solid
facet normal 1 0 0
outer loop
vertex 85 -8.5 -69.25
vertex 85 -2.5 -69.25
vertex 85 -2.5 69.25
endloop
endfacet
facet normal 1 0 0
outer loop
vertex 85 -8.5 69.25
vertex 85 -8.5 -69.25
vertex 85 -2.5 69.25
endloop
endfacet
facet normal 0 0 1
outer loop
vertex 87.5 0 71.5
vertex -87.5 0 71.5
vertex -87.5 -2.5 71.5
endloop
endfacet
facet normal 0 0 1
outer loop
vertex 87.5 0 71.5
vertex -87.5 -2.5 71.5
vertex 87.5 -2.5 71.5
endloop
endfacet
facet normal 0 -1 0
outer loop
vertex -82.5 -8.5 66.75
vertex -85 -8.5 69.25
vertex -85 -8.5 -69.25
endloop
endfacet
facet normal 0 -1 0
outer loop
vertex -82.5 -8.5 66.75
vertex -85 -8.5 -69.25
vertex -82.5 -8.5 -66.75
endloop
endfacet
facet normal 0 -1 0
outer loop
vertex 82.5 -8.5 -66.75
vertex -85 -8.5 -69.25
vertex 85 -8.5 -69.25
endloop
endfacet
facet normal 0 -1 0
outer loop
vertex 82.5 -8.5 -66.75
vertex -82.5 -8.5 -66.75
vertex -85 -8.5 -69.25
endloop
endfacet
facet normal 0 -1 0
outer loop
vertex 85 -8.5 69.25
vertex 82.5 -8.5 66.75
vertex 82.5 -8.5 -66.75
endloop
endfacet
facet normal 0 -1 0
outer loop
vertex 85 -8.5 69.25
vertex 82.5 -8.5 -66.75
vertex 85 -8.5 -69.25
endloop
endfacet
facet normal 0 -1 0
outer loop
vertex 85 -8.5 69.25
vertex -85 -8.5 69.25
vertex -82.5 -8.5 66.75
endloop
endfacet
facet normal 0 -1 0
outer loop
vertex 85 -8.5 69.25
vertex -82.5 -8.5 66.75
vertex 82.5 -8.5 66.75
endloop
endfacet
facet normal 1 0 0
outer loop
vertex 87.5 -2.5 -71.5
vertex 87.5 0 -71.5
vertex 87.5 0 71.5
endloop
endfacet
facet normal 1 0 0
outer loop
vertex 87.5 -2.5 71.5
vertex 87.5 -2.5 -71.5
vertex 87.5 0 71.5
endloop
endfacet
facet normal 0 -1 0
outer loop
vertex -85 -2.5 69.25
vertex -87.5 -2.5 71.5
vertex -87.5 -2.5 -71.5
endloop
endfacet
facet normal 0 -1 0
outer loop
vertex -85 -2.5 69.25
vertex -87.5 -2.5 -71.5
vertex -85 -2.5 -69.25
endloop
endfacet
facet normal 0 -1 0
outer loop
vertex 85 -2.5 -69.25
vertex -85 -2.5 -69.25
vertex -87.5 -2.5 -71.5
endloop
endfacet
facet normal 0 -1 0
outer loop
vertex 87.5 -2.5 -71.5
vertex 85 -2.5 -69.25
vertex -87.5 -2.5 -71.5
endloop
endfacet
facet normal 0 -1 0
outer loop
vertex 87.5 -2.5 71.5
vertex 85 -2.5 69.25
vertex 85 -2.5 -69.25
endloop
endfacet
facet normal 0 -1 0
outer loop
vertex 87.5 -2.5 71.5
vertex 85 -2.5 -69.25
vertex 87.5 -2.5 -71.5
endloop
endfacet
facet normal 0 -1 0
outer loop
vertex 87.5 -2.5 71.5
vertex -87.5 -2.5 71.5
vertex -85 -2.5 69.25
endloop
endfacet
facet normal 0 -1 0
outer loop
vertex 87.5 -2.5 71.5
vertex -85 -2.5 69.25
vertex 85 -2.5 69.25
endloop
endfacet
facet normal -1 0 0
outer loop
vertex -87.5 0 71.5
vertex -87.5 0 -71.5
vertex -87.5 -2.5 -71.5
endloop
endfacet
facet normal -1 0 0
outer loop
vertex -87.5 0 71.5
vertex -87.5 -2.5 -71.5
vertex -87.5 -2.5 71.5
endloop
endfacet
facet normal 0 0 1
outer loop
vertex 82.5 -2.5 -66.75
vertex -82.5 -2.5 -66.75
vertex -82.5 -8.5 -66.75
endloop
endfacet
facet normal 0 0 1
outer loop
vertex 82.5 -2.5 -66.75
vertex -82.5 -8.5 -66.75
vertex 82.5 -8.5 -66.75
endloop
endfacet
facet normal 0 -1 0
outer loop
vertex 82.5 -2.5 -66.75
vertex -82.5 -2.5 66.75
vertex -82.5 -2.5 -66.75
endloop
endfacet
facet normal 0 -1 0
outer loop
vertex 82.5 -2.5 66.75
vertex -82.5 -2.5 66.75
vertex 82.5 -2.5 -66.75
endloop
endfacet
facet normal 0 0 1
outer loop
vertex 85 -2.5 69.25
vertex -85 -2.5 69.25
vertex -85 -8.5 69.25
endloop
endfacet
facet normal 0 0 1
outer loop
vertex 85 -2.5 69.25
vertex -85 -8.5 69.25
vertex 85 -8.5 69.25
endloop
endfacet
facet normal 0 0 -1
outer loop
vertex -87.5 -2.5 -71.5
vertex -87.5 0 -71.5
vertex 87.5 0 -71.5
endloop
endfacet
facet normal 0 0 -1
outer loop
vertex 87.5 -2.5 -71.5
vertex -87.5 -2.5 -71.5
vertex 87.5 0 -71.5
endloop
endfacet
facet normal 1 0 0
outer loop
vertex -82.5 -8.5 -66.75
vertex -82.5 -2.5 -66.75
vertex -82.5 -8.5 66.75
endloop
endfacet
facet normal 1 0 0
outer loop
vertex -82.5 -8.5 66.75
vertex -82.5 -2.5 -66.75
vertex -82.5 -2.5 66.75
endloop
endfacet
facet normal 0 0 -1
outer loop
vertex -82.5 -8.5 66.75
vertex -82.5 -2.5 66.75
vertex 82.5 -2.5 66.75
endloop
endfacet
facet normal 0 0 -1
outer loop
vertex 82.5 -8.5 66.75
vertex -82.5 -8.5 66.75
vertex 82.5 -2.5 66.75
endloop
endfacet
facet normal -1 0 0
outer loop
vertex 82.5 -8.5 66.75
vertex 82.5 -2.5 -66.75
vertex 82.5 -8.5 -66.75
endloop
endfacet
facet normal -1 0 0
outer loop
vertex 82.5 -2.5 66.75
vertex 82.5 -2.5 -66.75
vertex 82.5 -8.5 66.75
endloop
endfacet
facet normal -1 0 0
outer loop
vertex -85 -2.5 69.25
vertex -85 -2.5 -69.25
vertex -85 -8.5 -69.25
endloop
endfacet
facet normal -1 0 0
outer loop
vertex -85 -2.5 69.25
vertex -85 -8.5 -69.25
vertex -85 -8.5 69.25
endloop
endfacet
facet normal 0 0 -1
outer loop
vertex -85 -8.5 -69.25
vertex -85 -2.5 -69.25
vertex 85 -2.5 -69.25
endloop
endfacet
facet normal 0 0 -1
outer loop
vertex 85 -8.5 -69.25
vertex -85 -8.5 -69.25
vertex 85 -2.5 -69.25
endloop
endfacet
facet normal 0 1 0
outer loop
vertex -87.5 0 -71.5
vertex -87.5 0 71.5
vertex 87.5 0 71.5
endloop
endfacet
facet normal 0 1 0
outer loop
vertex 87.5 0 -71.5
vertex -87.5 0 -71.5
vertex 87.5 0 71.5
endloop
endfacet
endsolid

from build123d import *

# Parameters (mm, degrees)
F0_W        = 175
F0_H        = 143
F1_DEPTH    = 2.5
F2_W        = 170
F2_H        = 138.5
F3_DEPTH    = 6
F4_T        = 2.5
F4_T3_DEPTH = 175
F4_T5_DEPTH = 143.5


# Not quite as in the source:
# - a shell that OpenCascade refuses in one call is made with other operations: the cavity is built on its own and cut out


with BuildPart() as f1:
    # F0 (on Front) → F1 (new body)
    with BuildSketch(Plane.XZ):
        Rectangle(F0_W, F0_H)
    extrude(amount=F1_DEPTH)

    # F2 (on face) → F3 (join)
    with BuildSketch(Plane.XZ.offset(2.5)):
        Rectangle(F2_W, F2_H)
    extrude(amount=F3_DEPTH)

    # F4: shell of thickness 2.5, made by hand


with BuildPart() as f4_core1:
    # F4_t2: copy of F1
    add(f1.part)

    # the walls: a layer under each face that stays
    f4_faces = [f4_core1.faces().sort_by_distance(p)[0] for p in [
        (0, -1.25, -71.5),
        (-87.5, -1.25, 0),
        (87.5, -1.25, 0),
        (0, 0, 0),
        (60.15625, -2.5, -69.7345679012),
        (0, -1.25, 71.5),
        (0, -5.5, -69.25),
        (85, -5.5, 0),
        (0, -5.5, 69.25),
        (-85, -5.5, 0),
    ]]
    thicken(f4_faces, amount=-F4_T, mode=Mode.SUBTRACT)

    # F4_s4 → F4_t3 (cut)
    with BuildSketch(Plane.YZ.offset(-87.5)):
        Polygon((-2.525, -69.275), (0, -69.25), (0, -66.75), (-2.5, -66.75), align=None)
        Polygon((-2.525, 69.275), (0, 69.25), (0, 66.75), (-2.5, 66.75), align=None)
    extrude(amount=F4_T3_DEPTH, mode=Mode.SUBTRACT)

    # F4_s6 → F4_t5 (cut)
    with BuildSketch(Plane.XY.offset(-71.75)):
        Polygon((85.025, -2.525), (85, 0), (82.5, 0), (82.5, -2.5), align=None)
        Polygon((-85.025, -2.525), (-85, 0), (-82.5, 0), (-82.5, -2.5), align=None)
    extrude(amount=F4_T5_DEPTH, mode=Mode.SUBTRACT)


with BuildPart() as f1_1:
    add(f1.part)

    # what is left inside the walls is the cavity
    f4_cavity = [f4_core1.part.solids().sort_by_distance(p)[0] for p in [
        (0, -2.525, -22.25),
    ]]
    add(f4_cavity, mode=Mode.SUBTRACT)


solid = f1_1.part
